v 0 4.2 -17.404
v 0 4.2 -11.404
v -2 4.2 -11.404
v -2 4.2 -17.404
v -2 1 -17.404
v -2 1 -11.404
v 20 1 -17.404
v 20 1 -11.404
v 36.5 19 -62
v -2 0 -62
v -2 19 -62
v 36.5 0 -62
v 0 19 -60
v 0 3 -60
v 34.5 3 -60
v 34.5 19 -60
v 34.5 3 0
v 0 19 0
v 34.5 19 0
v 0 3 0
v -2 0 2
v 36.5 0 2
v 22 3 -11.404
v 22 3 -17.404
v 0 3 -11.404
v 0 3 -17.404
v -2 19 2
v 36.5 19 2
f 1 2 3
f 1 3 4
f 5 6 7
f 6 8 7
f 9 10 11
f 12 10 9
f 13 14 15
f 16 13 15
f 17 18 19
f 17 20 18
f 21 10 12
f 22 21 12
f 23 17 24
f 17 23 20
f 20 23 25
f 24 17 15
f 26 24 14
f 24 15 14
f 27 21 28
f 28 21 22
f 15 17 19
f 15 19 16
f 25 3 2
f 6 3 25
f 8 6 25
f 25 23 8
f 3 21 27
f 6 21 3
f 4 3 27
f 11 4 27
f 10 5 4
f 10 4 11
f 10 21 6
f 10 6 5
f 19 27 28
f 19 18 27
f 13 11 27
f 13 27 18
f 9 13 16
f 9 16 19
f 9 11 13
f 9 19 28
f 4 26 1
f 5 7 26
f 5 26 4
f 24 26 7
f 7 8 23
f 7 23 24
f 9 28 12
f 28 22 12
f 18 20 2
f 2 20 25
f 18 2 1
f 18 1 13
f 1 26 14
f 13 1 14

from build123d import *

# Parameters (mm, degrees)
SKETCH1_W           = 34.5
SKETCH1_H           = 60
BOSS_EXTRUDE1_DEPTH = 1
SKETCH2_W           = 38.5
SKETCH2_H           = 64
SKETCH2_W_2         = 34.5
SKETCH2_H_2         = 60
BOSS_EXTRUDE2_DEPTH = 17
SKETCH3_W           = 6
SKETCH3_H           = 3.2
CUT_EXTRUDE1_DEPTH  = 17
BOSS_EXTRUDE3_DEPTH = 2
SKETCH5_W           = 38.5
SKETCH5_H           = 64
SKETCH5_W_2         = 34.5
SKETCH5_H_2         = 60
BOSS_EXTRUDE4_DEPTH = 2
CHAMFER1_SIZE       = 2


with BuildPart() as part:
    # Sketch1 → Boss-Extrude1 (new body)
    with BuildSketch(Plane(origin=(0, 0, 0), x_dir=(1, 0, 0), z_dir=(0, 1, 0))):
        with Locations((17.25, 30)):
            Rectangle(SKETCH1_W, SKETCH1_H)
    extrude(amount=BOSS_EXTRUDE1_DEPTH)

    # Sketch2 → Boss-Extrude2 (add)
    with BuildSketch(Plane.XZ):
        with Locations((17.25, -30)):
            Rectangle(SKETCH2_W, SKETCH2_H)
        with Locations((17.25, -30)):
            Rectangle(SKETCH2_W_2, SKETCH2_H_2, mode=Mode.SUBTRACT)
    extrude(amount=-BOSS_EXTRUDE2_DEPTH)

    # Sketch3 → Cut-Extrude1 (cut)
    with BuildSketch(Plane(origin=(0, 0, 0), x_dir=(0, 0, -1), z_dir=(1, 0, 0))):
        with Locations((14.404129658, 2.6)):
            Rectangle(SKETCH3_W, SKETCH3_H)
    extrude(amount=-CUT_EXTRUDE1_DEPTH, mode=Mode.SUBTRACT)

    # Sketch4 → Boss-Extrude3 (add)
    with BuildSketch(Plane(origin=(0, 1, 0), x_dir=(1, 0, 0), z_dir=(0, 1, 0))):
        Polygon((0, 60), (34.5, 60), (34.5, 0), (0, 0), (0, 11.404129658), (20, 11.404129658), (20, 17.404129658), (0, 17.404129658), align=None)
    extrude(amount=BOSS_EXTRUDE3_DEPTH)

    # Sketch5 → Boss-Extrude4 (add)
    with BuildSketch(Plane(origin=(0, 17, 0), x_dir=(1, 0, 0), z_dir=(0, 1, 0))):
        with Locations((17.25, 30)):
            Rectangle(SKETCH5_W, SKETCH5_H)
        with Locations((17.25, 30)):
            Rectangle(SKETCH5_W_2, SKETCH5_H_2, mode=Mode.SUBTRACT)
    extrude(amount=BOSS_EXTRUDE4_DEPTH)

    # Chamfer1
    chamfer1_edges = [part.edges().sort_by_distance(p)[0] for p in [
        (20, 3, -14.404129658),
    ]]
    chamfer(chamfer1_edges, length=CHAMFER1_SIZE - 0.0001)  # a hair under: the kernel refuses the full size


solid = part.part
